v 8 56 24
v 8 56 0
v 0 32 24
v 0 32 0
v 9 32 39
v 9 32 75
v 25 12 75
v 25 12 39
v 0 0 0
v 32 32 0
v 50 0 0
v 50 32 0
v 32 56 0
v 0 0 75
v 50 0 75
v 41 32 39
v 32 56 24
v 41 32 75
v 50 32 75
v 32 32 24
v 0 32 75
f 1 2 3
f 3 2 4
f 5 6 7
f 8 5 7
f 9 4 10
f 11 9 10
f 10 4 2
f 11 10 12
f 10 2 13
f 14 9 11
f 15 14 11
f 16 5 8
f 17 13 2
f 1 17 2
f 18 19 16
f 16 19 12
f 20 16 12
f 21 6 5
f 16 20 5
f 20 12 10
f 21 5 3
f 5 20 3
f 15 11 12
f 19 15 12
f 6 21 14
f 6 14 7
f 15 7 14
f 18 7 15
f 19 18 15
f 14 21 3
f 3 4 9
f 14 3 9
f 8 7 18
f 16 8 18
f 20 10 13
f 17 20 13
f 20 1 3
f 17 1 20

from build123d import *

# Parameters (mm, degrees)
BOSS_EXTRUDE1_DEPTH = 75
BOSS_EXTRUDE2_DEPTH = 24
CUT_EXTRUDE1_START  = 75
CUT_EXTRUDE1_DEPTH  = 36


with BuildPart() as part:
    # Sketch1 → Boss-Extrude1 (new body)
    with BuildSketch(Plane.XY):
        Polygon((25, 12), (9, 32), (0, 32), (0, 0), (50, 0), (50, 32), (41, 32), align=None)
        Polygon((32, 32), (9, 32), (25, 12), (41, 32), align=None)
    extrude(amount=BOSS_EXTRUDE1_DEPTH)

    # Sketch1<3> → Boss-Extrude2 (add)
    with BuildSketch(Plane.XY):
        Polygon((0, 32), (9, 32), (32, 32), (32, 56), (8, 56), align=None)
    extrude(amount=BOSS_EXTRUDE2_DEPTH)

    # Sketch1<4> → Cut-Extrude1 (cut)
    with BuildSketch(Plane.XY.offset(CUT_EXTRUDE1_START)):
        Polygon((32, 32), (9, 32), (25, 12), (41, 32), align=None)
    extrude(amount=-CUT_EXTRUDE1_DEPTH, mode=Mode.SUBTRACT)


solid = part.part
